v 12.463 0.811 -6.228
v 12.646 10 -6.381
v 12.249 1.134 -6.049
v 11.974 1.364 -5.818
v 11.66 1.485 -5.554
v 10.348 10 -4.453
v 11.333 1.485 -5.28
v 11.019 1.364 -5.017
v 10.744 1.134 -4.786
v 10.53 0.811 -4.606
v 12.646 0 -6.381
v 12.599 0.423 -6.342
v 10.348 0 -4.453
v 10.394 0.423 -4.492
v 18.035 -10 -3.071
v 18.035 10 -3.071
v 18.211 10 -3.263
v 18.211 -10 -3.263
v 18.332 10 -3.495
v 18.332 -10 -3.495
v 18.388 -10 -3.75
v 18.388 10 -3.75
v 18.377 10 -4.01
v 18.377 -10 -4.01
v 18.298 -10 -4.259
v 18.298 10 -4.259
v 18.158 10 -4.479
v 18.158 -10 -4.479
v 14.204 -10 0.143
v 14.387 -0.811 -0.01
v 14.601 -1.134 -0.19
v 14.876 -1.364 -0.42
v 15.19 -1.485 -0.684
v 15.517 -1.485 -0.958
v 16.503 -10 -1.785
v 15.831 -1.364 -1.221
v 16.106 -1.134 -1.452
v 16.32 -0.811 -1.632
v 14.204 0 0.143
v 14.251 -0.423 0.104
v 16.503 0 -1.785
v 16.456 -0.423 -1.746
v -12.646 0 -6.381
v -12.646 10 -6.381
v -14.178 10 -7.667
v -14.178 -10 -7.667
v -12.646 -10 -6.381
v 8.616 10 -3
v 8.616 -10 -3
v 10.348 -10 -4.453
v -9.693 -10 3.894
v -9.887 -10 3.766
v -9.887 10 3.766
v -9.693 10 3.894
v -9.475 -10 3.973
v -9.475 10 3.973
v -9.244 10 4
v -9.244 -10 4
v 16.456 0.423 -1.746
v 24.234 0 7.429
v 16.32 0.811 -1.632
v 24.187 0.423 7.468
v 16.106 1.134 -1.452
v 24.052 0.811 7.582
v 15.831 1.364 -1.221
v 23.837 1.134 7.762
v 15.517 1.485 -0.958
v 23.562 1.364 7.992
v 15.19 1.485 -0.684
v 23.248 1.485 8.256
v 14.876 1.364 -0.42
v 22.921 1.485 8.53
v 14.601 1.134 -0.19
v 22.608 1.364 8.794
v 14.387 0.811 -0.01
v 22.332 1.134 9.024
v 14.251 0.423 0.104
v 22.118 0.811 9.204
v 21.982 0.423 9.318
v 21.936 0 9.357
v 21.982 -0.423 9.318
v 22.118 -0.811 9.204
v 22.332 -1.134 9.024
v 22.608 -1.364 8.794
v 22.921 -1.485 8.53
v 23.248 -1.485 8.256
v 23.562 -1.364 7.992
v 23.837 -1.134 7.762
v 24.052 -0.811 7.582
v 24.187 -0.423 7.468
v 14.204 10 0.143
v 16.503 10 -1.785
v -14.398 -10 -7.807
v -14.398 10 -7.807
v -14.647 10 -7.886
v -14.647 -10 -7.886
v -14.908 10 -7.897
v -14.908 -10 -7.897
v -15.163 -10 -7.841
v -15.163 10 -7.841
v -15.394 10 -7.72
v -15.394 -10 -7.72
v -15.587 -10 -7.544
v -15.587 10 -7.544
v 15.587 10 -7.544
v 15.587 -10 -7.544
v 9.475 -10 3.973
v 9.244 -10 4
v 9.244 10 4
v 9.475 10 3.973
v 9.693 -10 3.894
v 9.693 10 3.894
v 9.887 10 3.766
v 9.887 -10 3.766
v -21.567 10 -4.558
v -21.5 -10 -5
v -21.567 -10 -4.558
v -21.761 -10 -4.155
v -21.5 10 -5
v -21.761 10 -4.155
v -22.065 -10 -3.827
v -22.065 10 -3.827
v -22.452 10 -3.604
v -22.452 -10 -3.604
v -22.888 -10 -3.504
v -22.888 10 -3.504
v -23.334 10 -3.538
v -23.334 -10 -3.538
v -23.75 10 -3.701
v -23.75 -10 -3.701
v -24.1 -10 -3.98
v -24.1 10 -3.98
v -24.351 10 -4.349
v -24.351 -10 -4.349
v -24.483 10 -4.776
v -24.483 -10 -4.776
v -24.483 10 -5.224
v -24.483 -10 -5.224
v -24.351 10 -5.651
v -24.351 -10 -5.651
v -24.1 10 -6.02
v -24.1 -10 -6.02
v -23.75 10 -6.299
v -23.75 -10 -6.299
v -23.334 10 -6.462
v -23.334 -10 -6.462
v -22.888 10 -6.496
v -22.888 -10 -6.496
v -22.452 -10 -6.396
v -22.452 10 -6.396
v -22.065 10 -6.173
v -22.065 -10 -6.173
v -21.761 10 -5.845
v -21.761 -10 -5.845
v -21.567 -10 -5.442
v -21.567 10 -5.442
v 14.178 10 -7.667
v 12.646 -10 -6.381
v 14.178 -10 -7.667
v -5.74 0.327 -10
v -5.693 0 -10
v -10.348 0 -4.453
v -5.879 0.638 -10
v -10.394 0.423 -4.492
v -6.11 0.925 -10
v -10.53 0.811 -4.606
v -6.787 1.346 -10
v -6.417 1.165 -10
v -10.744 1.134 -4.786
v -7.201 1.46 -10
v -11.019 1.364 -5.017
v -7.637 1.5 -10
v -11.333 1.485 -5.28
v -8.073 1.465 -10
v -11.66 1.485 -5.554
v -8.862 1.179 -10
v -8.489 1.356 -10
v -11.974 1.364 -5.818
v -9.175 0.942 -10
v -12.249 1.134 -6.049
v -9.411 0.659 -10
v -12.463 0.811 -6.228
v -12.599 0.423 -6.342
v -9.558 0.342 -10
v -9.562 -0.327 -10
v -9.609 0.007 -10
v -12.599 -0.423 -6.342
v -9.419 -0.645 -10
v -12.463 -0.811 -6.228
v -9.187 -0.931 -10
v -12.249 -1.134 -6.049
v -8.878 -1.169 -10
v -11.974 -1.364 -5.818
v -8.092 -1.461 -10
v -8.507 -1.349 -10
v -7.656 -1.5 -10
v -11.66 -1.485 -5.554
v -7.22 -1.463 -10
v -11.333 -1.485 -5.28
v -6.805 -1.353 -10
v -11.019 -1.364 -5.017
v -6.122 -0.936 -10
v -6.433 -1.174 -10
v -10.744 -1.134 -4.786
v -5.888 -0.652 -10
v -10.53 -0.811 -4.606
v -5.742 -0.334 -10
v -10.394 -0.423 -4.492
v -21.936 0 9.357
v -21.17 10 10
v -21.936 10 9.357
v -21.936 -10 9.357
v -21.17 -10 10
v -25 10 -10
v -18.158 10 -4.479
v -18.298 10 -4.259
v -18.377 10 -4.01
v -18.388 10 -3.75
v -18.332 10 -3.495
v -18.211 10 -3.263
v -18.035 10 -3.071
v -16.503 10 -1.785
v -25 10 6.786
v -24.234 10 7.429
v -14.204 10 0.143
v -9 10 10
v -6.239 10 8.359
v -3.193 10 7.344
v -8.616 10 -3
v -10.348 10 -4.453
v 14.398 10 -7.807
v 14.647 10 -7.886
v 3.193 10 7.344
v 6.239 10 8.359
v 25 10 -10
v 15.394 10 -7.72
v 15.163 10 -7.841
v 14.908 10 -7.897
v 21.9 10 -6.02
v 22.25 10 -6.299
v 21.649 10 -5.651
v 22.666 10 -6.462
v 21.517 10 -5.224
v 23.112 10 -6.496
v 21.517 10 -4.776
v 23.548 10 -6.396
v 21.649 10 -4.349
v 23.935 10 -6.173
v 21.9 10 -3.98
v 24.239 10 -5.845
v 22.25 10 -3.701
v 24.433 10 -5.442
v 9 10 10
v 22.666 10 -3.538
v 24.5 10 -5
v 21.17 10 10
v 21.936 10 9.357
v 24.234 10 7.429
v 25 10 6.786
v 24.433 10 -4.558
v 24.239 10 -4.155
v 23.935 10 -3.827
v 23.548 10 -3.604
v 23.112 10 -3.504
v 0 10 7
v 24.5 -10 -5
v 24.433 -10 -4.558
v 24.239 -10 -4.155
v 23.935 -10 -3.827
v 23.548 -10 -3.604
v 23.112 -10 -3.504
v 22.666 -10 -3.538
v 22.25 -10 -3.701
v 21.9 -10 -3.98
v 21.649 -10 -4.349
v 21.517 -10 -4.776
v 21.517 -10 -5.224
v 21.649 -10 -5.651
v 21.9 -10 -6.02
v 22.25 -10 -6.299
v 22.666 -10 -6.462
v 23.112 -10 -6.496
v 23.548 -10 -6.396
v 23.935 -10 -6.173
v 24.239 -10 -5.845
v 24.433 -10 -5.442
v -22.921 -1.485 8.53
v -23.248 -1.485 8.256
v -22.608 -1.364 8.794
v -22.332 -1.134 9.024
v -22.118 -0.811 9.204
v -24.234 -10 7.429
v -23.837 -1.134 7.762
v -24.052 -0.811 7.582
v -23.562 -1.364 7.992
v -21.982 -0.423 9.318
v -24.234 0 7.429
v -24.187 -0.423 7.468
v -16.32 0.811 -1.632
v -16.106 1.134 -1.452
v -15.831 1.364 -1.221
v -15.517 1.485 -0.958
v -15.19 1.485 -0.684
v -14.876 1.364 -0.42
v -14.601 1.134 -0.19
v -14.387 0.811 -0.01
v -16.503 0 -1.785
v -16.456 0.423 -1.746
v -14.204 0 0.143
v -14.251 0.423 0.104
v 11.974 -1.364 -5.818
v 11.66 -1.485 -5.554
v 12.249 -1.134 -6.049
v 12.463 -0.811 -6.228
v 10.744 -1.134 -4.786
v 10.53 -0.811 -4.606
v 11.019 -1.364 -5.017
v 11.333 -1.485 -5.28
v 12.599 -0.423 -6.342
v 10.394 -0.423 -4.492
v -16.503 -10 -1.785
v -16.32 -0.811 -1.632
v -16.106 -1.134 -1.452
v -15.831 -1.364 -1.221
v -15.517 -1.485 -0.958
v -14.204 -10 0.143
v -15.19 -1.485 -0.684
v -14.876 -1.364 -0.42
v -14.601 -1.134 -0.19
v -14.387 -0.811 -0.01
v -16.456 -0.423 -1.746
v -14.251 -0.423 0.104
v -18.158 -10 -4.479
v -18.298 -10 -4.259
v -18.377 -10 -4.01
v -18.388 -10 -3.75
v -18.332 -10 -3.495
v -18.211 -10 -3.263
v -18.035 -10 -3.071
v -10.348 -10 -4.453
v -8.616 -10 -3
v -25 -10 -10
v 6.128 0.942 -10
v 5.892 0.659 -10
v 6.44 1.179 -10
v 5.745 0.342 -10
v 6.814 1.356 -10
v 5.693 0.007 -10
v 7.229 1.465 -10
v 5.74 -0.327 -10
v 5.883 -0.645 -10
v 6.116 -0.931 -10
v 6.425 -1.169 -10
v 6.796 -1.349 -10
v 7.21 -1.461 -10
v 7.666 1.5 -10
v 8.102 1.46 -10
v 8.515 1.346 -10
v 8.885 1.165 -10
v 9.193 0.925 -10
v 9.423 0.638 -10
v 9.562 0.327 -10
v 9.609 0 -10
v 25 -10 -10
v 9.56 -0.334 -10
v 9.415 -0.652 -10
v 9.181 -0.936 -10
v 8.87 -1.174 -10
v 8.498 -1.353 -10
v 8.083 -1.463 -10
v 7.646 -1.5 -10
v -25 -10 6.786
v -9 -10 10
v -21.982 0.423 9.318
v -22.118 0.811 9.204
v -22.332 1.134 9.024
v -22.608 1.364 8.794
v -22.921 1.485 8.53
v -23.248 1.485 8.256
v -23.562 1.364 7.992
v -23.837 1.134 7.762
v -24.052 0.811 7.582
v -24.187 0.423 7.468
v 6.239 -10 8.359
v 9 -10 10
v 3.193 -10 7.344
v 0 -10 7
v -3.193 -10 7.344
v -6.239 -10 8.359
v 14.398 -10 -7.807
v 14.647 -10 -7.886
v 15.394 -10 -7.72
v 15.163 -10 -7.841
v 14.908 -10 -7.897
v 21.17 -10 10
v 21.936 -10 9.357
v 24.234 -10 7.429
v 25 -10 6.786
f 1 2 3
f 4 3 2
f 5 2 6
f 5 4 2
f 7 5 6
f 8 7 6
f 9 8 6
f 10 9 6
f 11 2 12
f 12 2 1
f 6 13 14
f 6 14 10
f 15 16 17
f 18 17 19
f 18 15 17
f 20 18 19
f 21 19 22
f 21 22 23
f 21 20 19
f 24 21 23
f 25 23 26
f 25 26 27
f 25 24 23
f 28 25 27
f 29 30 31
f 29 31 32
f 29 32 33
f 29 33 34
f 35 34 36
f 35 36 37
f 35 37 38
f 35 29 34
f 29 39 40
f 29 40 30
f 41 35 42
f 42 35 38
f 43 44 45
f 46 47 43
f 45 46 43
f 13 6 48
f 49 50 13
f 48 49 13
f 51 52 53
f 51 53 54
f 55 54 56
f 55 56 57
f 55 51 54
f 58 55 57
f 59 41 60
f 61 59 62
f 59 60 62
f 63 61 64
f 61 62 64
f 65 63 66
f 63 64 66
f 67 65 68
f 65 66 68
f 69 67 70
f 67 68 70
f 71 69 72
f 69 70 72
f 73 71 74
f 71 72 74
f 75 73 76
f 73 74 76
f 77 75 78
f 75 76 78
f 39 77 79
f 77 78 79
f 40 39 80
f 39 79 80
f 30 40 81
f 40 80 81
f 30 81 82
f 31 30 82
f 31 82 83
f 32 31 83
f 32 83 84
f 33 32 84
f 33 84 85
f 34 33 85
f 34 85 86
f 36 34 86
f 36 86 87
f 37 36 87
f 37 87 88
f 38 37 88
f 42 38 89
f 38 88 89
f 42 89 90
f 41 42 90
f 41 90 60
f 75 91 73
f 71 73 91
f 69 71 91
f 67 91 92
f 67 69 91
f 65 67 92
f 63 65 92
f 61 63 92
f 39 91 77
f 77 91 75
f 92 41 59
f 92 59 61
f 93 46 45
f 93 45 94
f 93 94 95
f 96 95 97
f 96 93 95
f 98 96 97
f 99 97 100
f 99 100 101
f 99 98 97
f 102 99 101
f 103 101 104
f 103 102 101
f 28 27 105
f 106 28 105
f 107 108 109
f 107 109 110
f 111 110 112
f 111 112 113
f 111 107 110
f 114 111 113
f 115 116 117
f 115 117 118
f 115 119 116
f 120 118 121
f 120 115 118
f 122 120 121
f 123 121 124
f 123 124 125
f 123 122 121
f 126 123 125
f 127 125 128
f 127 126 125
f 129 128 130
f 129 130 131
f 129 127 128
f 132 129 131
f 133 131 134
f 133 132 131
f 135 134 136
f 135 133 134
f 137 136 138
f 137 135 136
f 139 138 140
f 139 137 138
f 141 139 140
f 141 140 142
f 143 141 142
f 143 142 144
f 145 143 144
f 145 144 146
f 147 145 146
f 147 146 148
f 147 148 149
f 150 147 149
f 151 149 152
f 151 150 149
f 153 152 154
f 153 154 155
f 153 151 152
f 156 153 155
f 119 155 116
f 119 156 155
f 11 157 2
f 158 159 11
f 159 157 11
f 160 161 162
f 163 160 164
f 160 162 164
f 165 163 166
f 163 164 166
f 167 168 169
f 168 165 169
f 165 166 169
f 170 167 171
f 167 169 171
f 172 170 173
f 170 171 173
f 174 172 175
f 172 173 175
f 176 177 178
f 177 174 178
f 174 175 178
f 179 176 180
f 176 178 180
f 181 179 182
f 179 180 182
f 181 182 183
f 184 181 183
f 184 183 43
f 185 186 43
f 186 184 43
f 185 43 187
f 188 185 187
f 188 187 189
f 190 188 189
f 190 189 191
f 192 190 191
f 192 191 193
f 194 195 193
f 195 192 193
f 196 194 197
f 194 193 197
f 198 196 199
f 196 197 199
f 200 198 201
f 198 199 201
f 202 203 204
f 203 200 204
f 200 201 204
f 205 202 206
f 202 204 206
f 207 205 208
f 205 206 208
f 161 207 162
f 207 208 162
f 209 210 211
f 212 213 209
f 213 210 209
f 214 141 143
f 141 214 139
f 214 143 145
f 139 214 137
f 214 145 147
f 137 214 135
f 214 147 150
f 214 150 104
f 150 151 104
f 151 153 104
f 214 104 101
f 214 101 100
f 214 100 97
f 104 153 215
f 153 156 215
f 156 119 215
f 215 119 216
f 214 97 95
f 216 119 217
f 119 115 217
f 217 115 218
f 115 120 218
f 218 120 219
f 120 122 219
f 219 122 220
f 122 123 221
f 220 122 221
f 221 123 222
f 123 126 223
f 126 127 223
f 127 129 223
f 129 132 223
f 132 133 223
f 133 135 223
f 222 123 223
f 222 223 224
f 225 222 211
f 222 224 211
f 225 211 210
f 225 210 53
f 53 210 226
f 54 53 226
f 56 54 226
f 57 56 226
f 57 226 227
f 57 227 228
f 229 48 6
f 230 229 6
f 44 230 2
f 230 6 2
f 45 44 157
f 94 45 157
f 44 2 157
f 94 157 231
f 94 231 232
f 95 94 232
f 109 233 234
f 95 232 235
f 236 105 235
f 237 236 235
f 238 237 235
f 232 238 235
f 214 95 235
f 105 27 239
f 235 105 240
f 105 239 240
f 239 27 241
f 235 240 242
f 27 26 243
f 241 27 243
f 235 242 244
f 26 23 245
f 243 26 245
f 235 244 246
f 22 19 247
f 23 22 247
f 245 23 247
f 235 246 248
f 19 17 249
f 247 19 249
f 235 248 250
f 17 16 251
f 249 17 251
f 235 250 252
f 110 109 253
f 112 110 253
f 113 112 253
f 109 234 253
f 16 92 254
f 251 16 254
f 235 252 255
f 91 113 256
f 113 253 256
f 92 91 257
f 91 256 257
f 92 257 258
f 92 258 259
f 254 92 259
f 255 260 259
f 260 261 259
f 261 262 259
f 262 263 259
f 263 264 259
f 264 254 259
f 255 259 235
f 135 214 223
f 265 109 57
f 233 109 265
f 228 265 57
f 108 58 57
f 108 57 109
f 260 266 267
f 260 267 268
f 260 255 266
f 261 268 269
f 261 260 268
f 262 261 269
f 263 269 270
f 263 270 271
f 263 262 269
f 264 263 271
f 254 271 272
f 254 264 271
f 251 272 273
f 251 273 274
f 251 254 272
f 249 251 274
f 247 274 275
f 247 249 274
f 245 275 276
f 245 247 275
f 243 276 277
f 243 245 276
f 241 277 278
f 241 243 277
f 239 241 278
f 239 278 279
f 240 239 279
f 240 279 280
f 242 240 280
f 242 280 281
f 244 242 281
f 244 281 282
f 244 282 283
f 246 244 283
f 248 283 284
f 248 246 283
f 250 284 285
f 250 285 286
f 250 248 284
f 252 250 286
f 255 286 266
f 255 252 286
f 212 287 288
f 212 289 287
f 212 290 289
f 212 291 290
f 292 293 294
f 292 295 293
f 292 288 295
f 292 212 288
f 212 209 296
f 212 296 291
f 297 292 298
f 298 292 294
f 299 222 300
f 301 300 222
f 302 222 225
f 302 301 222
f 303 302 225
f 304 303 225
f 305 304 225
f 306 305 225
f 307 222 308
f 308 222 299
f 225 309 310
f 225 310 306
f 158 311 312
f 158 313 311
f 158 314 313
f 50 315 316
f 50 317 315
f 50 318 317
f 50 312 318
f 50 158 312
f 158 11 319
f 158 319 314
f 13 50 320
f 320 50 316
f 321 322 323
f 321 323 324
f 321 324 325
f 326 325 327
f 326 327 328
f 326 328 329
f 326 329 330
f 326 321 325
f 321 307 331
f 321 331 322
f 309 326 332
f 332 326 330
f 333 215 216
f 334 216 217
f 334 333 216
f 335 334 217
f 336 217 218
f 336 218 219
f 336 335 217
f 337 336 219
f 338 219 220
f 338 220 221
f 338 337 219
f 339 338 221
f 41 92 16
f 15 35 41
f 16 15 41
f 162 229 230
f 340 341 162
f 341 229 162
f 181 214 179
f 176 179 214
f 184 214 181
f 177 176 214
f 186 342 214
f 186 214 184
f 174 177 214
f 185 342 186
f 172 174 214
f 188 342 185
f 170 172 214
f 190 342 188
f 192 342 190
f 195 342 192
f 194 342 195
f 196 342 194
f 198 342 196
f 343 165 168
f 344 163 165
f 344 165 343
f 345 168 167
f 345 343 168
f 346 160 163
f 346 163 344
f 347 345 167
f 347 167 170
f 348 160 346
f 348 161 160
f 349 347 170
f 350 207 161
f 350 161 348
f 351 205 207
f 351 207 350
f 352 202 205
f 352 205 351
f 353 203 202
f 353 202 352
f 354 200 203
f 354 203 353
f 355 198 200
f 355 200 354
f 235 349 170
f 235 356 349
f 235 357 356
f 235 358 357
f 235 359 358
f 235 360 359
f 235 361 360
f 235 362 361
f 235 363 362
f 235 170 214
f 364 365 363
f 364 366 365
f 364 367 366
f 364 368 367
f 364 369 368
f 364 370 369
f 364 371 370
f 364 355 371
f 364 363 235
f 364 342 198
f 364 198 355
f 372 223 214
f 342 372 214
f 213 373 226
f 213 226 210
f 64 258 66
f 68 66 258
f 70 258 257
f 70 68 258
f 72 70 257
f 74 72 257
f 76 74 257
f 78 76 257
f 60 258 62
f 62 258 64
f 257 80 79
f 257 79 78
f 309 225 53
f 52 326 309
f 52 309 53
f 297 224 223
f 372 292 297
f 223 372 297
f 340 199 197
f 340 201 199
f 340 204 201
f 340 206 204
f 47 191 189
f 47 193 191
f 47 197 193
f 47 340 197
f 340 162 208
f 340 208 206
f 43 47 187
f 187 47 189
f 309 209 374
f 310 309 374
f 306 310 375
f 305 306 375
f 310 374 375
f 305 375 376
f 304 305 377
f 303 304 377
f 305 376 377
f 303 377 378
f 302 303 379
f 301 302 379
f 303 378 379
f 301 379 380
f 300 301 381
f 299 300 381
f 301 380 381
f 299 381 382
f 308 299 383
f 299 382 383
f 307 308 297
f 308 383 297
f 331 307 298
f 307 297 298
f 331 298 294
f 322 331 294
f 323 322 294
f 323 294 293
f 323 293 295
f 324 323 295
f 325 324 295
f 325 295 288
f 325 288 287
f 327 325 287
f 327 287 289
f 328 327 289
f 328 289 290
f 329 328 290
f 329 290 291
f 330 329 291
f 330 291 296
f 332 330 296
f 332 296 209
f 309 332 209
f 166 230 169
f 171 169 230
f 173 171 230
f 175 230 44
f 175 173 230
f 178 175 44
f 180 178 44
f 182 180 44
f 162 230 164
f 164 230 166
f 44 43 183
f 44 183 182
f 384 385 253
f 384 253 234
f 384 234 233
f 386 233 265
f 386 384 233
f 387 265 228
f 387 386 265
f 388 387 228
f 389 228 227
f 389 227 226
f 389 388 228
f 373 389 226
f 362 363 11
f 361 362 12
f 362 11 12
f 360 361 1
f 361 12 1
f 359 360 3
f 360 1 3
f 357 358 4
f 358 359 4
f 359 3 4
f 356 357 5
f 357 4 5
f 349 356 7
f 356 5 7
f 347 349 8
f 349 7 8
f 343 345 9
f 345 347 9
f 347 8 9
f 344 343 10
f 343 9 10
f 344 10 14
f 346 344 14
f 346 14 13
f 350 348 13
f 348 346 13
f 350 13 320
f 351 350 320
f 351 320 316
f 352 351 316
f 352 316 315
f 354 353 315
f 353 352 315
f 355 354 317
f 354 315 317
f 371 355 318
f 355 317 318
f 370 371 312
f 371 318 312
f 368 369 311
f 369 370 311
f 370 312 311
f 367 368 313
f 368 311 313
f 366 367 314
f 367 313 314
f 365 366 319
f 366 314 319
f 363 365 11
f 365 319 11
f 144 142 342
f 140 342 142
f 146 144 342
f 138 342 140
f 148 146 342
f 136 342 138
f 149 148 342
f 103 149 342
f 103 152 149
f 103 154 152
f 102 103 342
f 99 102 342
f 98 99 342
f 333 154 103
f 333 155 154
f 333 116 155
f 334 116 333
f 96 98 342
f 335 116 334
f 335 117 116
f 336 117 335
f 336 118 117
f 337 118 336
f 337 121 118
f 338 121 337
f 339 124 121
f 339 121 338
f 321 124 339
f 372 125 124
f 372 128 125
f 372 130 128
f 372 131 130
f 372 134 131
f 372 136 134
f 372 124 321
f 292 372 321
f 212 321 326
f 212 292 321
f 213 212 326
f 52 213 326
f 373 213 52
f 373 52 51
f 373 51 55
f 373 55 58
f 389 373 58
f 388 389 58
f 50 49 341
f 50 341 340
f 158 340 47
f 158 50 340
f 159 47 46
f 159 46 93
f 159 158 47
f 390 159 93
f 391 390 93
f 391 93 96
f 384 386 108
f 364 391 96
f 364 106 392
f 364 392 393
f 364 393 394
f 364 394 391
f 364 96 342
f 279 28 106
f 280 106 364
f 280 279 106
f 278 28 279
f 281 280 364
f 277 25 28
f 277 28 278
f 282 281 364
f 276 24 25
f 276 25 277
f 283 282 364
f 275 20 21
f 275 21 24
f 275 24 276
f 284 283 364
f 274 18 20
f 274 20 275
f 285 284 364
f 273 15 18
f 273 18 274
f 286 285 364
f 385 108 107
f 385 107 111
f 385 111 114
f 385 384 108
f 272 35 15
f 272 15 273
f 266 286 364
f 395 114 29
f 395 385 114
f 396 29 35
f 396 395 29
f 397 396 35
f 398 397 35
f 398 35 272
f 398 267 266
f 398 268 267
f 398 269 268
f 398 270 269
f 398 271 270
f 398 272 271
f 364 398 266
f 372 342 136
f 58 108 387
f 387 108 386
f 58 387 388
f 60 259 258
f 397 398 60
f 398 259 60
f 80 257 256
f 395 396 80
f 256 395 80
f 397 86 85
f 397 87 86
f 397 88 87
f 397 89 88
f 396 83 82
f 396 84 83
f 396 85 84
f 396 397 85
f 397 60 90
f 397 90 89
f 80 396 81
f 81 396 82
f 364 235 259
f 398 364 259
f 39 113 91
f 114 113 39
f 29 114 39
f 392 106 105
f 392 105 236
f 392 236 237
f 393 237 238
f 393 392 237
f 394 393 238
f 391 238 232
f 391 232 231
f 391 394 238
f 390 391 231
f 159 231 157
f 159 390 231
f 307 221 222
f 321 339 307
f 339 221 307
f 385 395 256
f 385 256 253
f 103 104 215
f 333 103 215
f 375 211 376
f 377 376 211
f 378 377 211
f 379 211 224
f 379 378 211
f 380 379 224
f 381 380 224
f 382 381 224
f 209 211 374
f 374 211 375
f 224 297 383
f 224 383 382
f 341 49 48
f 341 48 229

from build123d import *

# Parameters (mm, degrees)
F0_R     = 1.5
F1_DEPTH = 10
F2_R     = 1.5
F3_DEPTH = 44.9992499642
F4_R     = 1.5
F5_DEPTH = 44.9992499642


with BuildPart() as f1:
    # F0 (on Front) → F1 (new body, symmetric)
    with BuildSketch(Plane.XZ):
        with BuildLine():
            Line((9.6094143182, -10), (25, -10))
            Line((25, -10), (25, 6.7860619516))
            Line((25, 6.7860619516), (24.2339555569, 7.4288495613))
            Line((24.2339555569, 7.4288495613), (16.5025435388, -1.7850884872))
            Line((16.5025435388, -1.7850884872), (18.034632425, -3.0706637066))
            ThreePointArc((18.034632425, -3.0706637066), (18.3880395134, -3.7495524069), (18.1578892584, -4.4794957594))
            Line((18.1578892584, -4.4794957594), (15.5867388197, -7.5436735318))
            ThreePointArc((15.5867388197, -7.5436735318), (14.9078501193, -7.8970806202), (14.1779067669, -7.6669303653))
            Line((14.1779067669, -7.6669303653), (12.6458178806, -6.3813551459))
            Line((12.6458178806, -6.3813551459), (9.6094143182, -10))
        make_face()
        with Locations((23, -5)):
            Circle(F0_R, mode=Mode.SUBTRACT)
        Polygon((5.6931924502, -10), (9.6094143182, -10), (12.6458178806, -6.3813551459), (10.3476845513, -4.4529923168), align=None)
        Polygon((-5.6931924502, -10), (5.6931924502, -10), (10.3476845513, -4.4529923168), (8.6160757377, -3), (0, -3), (-8.6160757377, -3), (-10.3476845513, -4.4529923168), align=None)
        Polygon((16.5025435388, -1.7850884872), (24.2339555569, 7.4288495613), (21.9358222275, 9.3572123903), (14.2044102094, 0.1432743419), align=None)
        Polygon((-9.6094143182, -10), (-5.6931924502, -10), (-10.3476845513, -4.4529923168), (-12.6458178806, -6.3813551459), align=None)
        with BuildLine():
            Line((14.2044102094, 0.1432743419), (21.9358222275, 9.3572123903))
            Line((21.9358222275, 9.3572123903), (21.1697777844, 10))
            Line((21.1697777844, 10), (9, 10))
            ThreePointArc((9, 10), (4.7434164903, 7.7697505292), (0, 7))
            ThreePointArc((0, 7), (-4.7434164903, 7.7697505292), (-9, 10))
            Line((-9, 10), (-21.1697777844, 10))
            Line((-21.1697777844, 10), (-21.9358222275, 9.3572123903))
            Line((-21.9358222275, 9.3572123903), (-14.2044102094, 0.1432743419))
            Line((-14.2044102094, 0.1432743419), (-9.8869609261, 3.7660444431))
            ThreePointArc((-9.8869609261, 3.7660444431), (-9.5861934597, 3.9396926208), (-9.2441733164, 4))
            Line((-9.2441733164, 4), (0, 4))
            Line((0, 4), (9.2441733164, 4))
            ThreePointArc((9.2441733164, 4), (9.5861934597, 3.9396926208), (9.8869609261, 3.7660444431))
            Line((9.8869609261, 3.7660444431), (14.2044102094, 0.1432743419))
        make_face()
        with BuildLine():
            Line((-25, -10), (-9.6094143182, -10))
            Line((-9.6094143182, -10), (-12.6458178806, -6.3813551459))
            Line((-12.6458178806, -6.3813551459), (-14.1779067669, -7.6669303653))
            ThreePointArc((-14.1779067669, -7.6669303653), (-14.9078501193, -7.8970806202), (-15.5867388197, -7.5436735318))
            Line((-15.5867388197, -7.5436735318), (-18.1578892584, -4.4794957594))
            ThreePointArc((-18.1578892584, -4.4794957594), (-18.3880395134, -3.7495524069), (-18.034632425, -3.0706637066))
            Line((-18.034632425, -3.0706637066), (-16.5025435388, -1.7850884872))
            Line((-16.5025435388, -1.7850884872), (-24.2339555569, 7.4288495613))
            Line((-24.2339555569, 7.4288495613), (-25, 6.7860619516))
            Line((-25, 6.7860619516), (-25, -10))
        make_face()
        with Locations((-23, -5)):
            Circle(F0_R, mode=Mode.SUBTRACT)
        Polygon((-16.5025435388, -1.7850884872), (-14.2044102094, 0.1432743419), (-21.9358222275, 9.3572123903), (-24.2339555569, 7.4288495613), align=None)
    extrude(amount=F1_DEPTH, both=True)

    # F2 (on face) → F3 (cut, through all)
    with BuildSketch(Plane(origin=(-13.6708809903, 0, 16.2923215341), x_dir=(0.7660444431, 0, 0.6427876097), z_dir=(-0.6427876097, 0, 0.7660444431))):
        with Locations((-12.2891145369, 0)):
            Circle(F2_R)
    extrude(amount=-F3_DEPTH, mode=Mode.SUBTRACT)

    # F4 (on face) → F5 (cut, through all)
    with BuildSketch(Plane(origin=(13.6708809903, 0, 16.2923215341), x_dir=(0.7660444431, 0, -0.6427876097), z_dir=(0.6427876097, 0, 0.7660444431))):
        with Locations((12.2891145369, 0)):
            Circle(F4_R)
    extrude(amount=-F5_DEPTH, mode=Mode.SUBTRACT)


solid = f1.part
